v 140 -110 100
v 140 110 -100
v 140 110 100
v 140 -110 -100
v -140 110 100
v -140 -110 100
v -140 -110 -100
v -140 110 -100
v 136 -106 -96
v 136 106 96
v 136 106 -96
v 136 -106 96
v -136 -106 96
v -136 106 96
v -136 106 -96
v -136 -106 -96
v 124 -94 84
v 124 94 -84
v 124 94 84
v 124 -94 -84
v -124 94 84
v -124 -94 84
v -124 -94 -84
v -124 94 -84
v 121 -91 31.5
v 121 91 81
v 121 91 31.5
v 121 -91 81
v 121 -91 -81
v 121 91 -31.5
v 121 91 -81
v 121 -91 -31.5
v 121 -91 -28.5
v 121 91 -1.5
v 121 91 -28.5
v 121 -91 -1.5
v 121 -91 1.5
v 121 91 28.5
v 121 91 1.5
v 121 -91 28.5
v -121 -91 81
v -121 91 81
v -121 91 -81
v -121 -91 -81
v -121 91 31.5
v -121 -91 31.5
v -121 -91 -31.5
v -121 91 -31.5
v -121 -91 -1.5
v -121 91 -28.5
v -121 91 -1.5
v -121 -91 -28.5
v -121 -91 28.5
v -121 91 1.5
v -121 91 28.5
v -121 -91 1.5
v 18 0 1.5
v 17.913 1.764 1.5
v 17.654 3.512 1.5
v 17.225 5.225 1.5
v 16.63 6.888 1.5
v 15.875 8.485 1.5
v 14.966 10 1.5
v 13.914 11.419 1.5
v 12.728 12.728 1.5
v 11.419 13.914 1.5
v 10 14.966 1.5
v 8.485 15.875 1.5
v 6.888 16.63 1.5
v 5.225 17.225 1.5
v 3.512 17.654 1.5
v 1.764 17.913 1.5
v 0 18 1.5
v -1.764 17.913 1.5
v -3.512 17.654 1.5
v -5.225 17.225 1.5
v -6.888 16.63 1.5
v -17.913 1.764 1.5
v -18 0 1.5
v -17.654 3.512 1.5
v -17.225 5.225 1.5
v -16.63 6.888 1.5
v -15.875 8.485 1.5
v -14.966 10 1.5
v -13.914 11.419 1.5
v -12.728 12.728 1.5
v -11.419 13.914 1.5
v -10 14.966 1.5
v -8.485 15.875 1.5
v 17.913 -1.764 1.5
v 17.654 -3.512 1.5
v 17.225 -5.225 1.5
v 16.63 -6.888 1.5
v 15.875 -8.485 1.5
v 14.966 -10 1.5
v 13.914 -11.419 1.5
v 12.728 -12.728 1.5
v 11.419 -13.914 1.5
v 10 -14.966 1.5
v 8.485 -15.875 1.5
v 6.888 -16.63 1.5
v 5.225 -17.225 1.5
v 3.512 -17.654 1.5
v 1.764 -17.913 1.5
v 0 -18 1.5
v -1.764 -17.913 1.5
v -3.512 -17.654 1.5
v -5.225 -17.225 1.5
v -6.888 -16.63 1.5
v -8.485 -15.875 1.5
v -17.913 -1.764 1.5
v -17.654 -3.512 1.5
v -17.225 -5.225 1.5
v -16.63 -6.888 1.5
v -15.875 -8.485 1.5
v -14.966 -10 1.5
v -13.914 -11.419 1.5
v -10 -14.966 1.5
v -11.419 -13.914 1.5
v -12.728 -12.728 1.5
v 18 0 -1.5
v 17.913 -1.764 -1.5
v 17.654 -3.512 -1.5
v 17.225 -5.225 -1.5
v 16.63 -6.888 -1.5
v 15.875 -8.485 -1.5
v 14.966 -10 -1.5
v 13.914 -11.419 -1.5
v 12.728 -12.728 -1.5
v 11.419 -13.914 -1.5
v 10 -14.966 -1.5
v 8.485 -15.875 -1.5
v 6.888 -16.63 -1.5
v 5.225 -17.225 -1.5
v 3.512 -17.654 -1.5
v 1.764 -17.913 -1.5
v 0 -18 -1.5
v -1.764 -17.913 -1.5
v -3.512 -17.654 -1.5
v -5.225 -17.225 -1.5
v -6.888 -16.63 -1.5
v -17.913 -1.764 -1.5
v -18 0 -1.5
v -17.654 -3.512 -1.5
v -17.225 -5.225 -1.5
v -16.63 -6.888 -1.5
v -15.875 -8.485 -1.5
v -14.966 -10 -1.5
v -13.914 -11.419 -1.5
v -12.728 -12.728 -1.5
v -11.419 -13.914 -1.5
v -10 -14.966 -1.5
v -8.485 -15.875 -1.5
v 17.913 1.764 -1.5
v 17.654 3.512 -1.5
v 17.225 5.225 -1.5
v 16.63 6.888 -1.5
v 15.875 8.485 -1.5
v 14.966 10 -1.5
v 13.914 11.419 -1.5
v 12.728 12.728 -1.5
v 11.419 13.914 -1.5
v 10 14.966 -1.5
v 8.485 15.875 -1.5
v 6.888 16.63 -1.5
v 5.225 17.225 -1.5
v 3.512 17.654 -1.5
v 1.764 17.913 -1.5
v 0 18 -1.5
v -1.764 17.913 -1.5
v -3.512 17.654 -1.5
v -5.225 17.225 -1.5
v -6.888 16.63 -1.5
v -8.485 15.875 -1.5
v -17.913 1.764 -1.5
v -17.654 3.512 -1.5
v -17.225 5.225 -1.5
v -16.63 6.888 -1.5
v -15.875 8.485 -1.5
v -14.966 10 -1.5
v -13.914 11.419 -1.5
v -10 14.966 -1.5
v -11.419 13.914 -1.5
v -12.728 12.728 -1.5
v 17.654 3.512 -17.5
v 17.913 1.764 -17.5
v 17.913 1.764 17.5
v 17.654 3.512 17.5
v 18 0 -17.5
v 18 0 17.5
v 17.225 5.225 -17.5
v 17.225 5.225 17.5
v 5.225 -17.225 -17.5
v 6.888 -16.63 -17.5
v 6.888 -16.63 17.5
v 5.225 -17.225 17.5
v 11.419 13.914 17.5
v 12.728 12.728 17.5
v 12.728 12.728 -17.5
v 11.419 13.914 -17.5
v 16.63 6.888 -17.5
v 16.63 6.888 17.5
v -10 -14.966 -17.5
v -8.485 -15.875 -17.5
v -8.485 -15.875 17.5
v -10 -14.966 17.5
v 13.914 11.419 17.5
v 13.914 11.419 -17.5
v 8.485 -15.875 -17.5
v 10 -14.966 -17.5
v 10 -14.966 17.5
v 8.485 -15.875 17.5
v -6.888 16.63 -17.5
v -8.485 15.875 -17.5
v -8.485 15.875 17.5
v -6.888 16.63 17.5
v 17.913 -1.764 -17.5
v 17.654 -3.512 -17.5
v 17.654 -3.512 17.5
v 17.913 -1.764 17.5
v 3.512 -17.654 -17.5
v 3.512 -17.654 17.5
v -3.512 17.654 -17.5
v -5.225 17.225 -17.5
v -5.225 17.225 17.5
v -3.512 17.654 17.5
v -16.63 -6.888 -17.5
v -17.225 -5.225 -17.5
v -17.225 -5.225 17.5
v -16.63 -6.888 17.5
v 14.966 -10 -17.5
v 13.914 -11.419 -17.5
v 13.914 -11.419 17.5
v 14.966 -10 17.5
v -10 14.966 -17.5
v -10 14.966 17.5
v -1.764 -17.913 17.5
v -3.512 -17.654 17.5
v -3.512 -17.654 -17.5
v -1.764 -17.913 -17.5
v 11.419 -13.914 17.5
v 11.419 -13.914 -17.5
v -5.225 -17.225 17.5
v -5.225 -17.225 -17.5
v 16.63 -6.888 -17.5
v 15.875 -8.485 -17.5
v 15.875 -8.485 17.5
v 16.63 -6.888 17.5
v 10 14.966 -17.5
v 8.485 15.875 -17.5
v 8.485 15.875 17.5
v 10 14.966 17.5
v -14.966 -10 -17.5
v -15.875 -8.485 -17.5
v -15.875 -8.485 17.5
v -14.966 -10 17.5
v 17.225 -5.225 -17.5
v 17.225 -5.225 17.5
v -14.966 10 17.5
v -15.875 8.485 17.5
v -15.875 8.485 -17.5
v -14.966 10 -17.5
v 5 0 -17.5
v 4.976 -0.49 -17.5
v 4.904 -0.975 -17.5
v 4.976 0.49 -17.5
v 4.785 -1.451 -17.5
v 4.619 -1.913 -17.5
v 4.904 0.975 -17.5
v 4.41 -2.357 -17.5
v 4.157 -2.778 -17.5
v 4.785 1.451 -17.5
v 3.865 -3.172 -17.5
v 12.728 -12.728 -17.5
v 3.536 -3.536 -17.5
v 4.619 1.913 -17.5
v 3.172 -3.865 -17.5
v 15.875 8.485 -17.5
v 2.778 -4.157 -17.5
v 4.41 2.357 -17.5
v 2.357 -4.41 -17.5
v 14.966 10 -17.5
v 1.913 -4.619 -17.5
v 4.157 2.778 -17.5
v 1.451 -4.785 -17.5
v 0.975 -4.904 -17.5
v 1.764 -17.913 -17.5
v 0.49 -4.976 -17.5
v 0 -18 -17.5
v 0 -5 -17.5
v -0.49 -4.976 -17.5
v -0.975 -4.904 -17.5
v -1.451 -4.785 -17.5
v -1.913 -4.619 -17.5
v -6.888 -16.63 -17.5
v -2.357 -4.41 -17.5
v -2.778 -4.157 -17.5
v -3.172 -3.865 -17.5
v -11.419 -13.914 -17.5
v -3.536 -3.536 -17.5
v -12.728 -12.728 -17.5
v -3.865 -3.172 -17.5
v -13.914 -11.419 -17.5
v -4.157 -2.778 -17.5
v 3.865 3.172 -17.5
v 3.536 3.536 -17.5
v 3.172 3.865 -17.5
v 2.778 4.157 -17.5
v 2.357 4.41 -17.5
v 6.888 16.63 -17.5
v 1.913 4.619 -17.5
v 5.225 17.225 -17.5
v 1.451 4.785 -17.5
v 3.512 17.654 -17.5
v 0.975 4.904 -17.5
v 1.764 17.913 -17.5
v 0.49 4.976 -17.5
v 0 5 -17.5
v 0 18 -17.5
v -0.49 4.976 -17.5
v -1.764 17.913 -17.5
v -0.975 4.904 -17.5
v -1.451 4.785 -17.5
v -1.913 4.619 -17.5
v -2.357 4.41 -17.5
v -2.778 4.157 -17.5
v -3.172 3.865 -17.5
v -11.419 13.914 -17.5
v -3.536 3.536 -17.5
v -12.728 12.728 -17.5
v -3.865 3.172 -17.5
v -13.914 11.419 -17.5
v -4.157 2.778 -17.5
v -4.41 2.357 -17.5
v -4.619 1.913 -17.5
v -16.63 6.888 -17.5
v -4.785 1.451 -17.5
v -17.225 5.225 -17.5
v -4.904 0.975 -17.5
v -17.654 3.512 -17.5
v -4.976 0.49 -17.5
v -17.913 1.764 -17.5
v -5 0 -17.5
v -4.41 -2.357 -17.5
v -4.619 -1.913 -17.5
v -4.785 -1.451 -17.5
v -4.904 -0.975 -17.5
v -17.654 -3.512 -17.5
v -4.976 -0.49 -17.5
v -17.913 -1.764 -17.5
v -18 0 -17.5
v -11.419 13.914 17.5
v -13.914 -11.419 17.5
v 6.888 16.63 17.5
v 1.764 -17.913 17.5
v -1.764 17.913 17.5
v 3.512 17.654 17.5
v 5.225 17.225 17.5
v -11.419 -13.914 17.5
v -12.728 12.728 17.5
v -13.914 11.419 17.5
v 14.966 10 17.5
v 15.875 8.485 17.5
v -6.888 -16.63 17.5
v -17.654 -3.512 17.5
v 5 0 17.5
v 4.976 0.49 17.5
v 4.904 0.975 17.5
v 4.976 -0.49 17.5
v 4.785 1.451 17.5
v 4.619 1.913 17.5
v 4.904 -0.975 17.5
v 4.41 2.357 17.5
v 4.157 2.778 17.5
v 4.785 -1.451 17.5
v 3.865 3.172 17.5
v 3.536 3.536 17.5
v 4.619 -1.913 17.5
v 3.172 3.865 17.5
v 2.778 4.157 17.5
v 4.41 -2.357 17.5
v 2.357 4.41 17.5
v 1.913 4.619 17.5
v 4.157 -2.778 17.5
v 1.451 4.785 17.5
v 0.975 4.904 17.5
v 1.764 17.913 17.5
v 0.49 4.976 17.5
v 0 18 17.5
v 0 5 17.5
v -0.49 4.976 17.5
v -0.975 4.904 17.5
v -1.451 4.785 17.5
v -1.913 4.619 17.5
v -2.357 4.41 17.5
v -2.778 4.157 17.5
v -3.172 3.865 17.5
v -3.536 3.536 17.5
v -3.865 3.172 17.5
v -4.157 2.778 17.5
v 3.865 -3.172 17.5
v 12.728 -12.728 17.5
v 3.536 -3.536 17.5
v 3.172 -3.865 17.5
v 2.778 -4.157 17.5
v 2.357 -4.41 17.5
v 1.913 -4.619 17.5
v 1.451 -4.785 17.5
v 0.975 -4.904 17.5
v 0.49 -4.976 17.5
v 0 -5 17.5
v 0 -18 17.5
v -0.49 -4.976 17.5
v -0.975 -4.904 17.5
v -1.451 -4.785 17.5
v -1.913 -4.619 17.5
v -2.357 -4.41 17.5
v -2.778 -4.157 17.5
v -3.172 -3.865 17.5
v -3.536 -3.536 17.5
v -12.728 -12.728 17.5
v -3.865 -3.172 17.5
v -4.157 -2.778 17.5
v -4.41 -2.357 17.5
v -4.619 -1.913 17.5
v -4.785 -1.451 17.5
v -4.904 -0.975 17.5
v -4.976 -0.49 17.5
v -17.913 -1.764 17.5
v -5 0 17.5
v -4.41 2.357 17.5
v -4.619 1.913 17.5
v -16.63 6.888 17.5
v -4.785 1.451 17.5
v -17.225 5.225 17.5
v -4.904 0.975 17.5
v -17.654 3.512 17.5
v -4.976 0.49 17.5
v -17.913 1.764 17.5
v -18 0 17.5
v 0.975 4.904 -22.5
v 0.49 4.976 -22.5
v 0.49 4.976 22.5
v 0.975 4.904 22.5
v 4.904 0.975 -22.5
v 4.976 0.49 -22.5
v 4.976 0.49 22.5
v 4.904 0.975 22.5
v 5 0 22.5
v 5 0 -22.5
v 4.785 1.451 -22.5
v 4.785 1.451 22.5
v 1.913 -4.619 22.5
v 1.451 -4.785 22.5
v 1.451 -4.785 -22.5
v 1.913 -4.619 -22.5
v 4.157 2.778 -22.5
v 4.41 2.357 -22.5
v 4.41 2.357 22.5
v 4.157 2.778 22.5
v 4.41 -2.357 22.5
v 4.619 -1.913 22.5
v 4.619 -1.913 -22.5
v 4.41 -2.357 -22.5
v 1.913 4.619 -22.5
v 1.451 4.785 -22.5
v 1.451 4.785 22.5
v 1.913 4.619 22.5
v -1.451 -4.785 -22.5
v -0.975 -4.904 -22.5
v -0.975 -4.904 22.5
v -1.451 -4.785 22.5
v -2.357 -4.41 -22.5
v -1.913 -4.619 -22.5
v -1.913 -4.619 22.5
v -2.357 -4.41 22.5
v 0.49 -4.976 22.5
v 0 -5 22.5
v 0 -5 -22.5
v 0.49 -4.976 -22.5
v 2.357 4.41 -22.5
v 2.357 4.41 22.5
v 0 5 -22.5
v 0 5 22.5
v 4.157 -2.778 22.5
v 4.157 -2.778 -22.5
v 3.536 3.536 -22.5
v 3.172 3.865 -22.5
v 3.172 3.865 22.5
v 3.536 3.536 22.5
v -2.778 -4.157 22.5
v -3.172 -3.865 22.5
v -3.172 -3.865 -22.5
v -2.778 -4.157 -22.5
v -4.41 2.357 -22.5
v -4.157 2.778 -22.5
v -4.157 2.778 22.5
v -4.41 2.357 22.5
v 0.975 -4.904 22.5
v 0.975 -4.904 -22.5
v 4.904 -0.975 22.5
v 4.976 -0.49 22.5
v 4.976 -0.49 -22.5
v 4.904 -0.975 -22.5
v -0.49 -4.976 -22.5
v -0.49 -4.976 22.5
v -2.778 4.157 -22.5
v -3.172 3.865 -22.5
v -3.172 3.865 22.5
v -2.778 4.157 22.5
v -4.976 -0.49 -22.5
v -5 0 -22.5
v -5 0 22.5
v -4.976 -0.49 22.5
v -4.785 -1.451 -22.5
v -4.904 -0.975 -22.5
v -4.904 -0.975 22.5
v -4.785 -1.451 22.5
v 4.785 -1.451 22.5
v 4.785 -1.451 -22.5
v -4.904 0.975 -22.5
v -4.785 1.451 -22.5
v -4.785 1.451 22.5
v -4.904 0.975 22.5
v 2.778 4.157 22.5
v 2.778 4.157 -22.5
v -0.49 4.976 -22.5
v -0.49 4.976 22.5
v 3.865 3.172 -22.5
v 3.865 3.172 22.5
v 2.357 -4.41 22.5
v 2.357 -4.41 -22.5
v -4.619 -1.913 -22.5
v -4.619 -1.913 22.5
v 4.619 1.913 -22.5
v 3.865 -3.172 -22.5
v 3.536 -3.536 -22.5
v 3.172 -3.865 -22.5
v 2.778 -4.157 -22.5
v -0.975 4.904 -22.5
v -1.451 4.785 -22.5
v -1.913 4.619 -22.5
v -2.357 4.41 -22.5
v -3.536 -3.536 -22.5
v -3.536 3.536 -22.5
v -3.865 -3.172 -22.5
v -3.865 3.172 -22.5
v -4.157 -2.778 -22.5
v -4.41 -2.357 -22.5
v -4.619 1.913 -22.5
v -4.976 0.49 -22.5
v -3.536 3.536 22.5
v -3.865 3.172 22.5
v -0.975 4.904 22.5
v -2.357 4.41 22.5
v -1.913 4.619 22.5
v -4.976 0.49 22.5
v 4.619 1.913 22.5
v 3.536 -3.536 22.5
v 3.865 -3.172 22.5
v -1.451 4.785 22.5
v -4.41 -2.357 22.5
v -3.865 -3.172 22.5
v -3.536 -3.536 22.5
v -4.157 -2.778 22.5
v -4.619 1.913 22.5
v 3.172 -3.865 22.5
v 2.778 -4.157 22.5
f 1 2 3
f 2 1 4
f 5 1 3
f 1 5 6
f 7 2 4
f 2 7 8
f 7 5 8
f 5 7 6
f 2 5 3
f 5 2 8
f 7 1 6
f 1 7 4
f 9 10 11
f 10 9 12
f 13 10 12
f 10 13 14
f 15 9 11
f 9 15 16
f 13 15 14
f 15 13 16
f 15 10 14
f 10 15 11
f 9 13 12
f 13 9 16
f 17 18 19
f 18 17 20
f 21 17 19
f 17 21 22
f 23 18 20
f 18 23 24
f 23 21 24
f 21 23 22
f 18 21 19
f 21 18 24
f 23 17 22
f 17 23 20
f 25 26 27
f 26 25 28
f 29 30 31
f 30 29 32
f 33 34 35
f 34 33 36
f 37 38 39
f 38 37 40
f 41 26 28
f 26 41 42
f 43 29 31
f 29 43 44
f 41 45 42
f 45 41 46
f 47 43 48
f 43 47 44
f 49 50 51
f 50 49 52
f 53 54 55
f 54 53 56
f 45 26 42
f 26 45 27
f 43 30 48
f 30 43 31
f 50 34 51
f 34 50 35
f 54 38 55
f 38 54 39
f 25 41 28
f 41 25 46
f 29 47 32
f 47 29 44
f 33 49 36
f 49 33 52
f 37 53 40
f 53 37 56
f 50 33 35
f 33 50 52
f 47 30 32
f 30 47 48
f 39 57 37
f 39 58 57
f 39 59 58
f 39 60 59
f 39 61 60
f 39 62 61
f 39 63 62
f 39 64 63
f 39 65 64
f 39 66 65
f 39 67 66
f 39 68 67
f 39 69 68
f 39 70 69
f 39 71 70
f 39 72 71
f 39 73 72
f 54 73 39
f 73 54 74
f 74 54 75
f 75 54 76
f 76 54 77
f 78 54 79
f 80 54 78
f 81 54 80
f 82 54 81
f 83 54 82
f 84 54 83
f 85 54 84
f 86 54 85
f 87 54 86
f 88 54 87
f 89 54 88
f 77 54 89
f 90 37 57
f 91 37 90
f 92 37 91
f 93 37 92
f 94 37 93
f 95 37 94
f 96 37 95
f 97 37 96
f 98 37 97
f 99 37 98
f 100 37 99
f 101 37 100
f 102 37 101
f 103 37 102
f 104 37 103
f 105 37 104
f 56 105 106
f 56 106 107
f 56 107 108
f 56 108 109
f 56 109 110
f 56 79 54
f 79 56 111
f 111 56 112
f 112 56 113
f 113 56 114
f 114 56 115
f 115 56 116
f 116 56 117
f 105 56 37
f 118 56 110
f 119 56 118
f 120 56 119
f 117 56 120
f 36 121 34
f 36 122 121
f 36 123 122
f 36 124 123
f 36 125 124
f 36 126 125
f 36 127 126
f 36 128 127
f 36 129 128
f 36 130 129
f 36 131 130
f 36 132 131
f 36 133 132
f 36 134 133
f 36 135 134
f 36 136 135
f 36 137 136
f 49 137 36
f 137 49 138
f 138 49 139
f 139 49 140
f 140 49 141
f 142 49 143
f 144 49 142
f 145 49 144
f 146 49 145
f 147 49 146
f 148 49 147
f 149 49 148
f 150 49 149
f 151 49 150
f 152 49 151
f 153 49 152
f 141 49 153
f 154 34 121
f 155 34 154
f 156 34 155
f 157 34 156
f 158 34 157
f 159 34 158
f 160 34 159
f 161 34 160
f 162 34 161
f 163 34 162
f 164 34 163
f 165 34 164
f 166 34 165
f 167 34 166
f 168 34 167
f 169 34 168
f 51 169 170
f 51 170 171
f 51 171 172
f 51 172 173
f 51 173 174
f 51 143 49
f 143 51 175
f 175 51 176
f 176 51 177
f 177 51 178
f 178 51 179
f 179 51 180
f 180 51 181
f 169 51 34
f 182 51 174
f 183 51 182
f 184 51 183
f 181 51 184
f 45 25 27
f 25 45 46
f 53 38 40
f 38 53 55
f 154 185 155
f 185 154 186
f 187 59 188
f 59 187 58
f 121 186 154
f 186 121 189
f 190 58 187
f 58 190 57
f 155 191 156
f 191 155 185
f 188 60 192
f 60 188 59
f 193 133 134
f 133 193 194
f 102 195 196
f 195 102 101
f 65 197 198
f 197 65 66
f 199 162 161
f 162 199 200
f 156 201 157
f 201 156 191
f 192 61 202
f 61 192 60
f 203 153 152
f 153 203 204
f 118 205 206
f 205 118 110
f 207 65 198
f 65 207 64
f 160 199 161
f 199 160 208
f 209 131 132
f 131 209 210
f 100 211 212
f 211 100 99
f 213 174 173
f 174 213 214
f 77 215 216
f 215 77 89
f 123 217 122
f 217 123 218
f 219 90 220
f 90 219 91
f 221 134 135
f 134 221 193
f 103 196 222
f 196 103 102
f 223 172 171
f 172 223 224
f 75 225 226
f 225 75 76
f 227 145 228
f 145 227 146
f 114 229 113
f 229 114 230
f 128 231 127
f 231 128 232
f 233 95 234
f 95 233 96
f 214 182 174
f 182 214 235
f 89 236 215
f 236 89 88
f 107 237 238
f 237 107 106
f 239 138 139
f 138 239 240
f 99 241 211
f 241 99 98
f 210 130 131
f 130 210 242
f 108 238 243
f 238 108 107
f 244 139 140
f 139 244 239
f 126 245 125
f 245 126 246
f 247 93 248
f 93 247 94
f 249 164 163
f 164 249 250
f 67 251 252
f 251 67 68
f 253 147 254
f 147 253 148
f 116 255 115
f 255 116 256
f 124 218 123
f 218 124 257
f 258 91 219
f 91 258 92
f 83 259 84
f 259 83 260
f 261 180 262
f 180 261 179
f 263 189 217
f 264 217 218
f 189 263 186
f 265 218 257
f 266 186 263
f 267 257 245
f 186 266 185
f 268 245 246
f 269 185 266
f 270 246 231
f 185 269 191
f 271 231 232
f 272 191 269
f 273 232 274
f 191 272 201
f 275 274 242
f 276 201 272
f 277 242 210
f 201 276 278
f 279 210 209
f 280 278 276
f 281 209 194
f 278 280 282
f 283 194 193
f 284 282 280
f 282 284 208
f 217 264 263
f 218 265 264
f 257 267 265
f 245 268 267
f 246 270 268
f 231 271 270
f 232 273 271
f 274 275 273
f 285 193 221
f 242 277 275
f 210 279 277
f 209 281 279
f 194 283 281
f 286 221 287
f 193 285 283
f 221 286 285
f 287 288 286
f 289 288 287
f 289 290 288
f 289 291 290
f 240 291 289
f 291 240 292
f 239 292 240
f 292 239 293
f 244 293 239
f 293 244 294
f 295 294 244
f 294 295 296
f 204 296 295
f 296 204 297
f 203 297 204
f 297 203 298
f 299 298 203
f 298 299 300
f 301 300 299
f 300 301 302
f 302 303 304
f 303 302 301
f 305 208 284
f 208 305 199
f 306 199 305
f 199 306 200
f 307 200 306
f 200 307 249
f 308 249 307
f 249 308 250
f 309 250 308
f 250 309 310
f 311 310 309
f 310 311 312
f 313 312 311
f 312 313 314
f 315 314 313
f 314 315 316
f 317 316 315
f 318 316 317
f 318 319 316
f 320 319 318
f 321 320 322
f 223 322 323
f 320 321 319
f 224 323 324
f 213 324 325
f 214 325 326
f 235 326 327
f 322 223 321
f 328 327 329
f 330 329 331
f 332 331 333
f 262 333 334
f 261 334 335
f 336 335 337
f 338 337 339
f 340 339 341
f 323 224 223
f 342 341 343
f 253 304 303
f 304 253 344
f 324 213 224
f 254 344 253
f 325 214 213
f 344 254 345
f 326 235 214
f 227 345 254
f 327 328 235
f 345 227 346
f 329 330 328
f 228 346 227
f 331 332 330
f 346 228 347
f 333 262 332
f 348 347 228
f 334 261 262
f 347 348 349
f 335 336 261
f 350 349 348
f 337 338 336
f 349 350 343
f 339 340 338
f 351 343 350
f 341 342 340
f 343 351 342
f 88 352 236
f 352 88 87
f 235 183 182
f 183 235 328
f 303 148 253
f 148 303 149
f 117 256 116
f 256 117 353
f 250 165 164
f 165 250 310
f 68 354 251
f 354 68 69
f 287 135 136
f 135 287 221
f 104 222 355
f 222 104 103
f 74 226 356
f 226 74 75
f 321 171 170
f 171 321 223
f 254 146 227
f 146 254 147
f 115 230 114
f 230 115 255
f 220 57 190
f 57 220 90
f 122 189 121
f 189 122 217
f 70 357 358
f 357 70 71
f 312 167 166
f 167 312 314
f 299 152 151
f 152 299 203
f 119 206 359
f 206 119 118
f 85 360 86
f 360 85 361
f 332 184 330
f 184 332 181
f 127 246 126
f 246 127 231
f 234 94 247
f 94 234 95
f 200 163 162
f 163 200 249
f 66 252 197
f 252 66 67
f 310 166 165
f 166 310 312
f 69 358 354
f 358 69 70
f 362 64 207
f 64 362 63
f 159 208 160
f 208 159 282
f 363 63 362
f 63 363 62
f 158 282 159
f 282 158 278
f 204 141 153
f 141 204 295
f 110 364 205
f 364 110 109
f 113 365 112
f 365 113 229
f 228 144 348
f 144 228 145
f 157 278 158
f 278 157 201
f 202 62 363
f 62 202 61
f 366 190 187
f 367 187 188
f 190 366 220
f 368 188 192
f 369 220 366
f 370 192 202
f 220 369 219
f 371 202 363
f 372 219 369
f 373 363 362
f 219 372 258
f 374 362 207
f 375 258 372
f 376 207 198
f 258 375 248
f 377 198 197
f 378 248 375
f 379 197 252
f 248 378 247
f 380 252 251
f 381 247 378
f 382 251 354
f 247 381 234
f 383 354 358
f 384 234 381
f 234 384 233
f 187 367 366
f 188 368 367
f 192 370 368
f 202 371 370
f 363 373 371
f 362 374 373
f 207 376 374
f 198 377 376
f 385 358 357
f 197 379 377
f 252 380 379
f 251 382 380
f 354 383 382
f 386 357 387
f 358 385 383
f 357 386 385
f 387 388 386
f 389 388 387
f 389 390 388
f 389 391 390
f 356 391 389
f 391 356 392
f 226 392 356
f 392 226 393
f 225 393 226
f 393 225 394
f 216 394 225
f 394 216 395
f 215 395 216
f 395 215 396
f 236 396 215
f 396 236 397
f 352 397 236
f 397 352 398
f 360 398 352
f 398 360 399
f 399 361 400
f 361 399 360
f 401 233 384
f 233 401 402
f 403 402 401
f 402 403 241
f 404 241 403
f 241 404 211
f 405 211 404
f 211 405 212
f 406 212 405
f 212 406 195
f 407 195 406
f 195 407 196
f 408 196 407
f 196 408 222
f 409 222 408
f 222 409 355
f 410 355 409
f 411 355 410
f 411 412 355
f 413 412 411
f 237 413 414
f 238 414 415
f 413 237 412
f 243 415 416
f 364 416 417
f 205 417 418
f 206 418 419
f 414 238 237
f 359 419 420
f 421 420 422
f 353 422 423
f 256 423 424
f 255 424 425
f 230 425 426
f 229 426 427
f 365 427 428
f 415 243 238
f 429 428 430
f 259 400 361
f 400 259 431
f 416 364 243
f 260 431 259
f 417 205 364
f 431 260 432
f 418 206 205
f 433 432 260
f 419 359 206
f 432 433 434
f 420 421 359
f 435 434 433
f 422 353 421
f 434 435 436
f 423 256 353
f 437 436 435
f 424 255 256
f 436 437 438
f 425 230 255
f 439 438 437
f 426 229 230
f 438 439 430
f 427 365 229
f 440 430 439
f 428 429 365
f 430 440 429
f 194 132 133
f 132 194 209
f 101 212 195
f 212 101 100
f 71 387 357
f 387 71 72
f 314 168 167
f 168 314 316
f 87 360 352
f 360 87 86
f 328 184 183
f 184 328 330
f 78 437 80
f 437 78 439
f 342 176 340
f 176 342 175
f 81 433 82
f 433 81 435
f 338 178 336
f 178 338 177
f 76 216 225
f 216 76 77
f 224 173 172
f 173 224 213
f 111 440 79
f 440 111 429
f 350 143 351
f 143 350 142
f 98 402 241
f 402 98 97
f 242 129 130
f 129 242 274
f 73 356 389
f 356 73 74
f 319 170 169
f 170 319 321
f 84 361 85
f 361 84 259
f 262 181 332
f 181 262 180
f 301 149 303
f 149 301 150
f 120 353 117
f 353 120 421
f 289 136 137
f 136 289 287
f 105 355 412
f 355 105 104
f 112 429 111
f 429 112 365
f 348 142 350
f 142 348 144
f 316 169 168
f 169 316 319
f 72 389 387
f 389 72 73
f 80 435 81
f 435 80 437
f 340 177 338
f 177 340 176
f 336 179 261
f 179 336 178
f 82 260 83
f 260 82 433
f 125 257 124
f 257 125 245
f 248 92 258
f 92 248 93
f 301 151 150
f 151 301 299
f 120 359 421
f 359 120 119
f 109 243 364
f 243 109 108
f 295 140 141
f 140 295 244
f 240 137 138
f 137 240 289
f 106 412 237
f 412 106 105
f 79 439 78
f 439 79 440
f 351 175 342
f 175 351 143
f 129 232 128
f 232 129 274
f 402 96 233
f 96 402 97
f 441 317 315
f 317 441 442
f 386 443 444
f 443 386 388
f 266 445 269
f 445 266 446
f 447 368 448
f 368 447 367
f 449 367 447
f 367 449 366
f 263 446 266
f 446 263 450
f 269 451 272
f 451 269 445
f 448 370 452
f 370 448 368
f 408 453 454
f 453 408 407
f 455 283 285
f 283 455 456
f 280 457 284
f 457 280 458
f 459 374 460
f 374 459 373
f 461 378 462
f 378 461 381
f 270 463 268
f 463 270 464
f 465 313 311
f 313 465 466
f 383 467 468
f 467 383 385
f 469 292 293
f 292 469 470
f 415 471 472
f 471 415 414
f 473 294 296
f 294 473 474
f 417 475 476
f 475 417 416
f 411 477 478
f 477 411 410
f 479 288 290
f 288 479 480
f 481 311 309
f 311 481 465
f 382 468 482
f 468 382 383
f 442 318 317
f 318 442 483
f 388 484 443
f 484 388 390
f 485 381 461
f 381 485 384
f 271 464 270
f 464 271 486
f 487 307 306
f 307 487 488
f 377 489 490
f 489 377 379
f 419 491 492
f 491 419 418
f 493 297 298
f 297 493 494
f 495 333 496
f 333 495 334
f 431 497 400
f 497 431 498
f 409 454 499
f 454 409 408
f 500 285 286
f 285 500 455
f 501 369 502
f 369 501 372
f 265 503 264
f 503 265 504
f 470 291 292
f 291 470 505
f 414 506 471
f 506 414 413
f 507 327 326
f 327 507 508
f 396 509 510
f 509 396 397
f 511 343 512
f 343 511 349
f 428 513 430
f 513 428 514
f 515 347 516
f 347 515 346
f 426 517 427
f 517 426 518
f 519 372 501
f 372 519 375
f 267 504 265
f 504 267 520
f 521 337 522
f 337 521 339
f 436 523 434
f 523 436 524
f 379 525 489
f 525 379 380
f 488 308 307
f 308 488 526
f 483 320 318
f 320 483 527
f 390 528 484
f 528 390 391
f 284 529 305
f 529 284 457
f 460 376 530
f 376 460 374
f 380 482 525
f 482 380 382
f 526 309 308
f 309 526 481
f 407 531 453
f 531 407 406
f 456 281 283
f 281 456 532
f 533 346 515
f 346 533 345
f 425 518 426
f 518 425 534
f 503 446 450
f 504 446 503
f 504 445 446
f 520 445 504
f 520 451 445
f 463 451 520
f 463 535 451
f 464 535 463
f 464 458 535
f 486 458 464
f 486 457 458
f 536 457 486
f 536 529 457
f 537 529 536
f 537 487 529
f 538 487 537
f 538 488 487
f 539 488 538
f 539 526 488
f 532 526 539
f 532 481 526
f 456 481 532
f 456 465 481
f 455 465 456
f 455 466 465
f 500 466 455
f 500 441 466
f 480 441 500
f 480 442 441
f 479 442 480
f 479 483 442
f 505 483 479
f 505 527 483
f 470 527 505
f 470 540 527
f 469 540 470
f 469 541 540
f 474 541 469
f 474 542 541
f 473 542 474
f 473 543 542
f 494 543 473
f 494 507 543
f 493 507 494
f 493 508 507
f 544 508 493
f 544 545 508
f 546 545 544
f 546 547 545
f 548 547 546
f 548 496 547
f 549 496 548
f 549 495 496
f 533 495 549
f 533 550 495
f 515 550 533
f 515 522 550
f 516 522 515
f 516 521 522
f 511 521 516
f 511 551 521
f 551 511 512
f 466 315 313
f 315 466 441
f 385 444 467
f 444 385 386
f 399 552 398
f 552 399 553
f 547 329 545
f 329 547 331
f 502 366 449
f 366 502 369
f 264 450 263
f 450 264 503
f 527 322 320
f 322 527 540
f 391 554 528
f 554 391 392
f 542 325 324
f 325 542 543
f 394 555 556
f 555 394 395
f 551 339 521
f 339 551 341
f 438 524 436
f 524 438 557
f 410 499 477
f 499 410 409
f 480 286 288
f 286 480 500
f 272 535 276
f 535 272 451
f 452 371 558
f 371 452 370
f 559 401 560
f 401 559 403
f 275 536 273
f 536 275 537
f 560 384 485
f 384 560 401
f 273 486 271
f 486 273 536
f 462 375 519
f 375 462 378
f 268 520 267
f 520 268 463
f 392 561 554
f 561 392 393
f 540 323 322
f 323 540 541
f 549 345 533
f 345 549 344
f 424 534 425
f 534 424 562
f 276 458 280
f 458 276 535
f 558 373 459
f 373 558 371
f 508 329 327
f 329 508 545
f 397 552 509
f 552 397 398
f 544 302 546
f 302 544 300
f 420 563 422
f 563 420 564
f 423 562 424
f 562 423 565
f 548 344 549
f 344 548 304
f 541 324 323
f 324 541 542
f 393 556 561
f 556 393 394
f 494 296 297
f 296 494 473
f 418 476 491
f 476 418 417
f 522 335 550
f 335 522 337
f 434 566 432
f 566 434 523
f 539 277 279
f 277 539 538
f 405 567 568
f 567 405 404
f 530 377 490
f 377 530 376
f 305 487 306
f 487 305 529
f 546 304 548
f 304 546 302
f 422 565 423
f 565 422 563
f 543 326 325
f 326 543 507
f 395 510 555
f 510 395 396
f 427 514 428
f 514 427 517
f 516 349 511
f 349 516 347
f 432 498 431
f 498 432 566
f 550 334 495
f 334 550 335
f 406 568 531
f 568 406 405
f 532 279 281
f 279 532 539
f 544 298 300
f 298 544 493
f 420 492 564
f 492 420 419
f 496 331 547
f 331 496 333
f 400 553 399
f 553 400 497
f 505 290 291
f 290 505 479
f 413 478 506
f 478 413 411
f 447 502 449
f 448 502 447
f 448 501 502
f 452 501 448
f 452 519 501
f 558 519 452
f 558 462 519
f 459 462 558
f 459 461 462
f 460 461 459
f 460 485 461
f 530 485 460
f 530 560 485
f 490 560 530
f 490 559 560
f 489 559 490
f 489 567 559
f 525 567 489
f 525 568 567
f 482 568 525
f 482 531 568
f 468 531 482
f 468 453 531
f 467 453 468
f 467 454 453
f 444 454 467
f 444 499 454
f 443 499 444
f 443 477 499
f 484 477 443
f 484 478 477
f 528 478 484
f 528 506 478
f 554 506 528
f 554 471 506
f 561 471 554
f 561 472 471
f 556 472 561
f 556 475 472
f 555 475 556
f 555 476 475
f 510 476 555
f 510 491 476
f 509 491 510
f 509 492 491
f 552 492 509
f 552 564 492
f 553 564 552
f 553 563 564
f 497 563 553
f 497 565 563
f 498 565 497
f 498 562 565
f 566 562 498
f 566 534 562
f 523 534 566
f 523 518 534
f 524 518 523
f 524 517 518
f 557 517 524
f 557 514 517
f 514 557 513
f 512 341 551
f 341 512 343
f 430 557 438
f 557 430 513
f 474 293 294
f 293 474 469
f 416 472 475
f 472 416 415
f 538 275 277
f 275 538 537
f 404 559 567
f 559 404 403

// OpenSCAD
// File: docs/hardware/mechanical/biochem_incubator_housing.scad
// System: USS Iowa Biochemical Lab Module - Shock-Stabilized Incubator Housing
// Adheres to parameters for BIOCHEM-970-1070 and Verdura-Rx processing arrays

$fn = 64;

// Housing Enclosure Parameters (in millimeters)
ext_width   = 280.0;
ext_depth   = 220.0;
ext_height  = 200.0;
insulation_t = 12.0;
wall_t       = 4.0;

module insulated_outer_shell() {
    difference() {
        // Outer Protective Armor Hull
        color("slategrey") 
            cube([ext_width, ext_depth, ext_height], center = true);
        
        // Inner Insulation Cavity Boundary
        cube([ext_width - (wall_t * 2), 
              ext_depth - (wall_t * 2), 
              ext_height - (wall_t * 2)], center = true);
    }
}

module internal_incubation_chamber() {
    // Suspended internal structural compartment hosting internal processing trays
    inner_w = ext_width - (wall_t * 2) - (insulation_t * 2);
    inner_d = ext_depth - (wall_t * 2) - (insulation_t * 2);
    inner_h = ext_height - (wall_t * 2) - (insulation_t * 2);

    translate([0, 0, 0]) {
        difference() {
            // Lab Grade Chamber Core Block
            color("ghostwhite", 0.8) 
                cube([inner_w, inner_d, inner_h], center = true);
            
            // Working Core Volume Cutout
            cube([inner_w - 6, inner_d - 6, inner_h - 6], center = true);
        }
        
        // Internal Rack Guide Support Tracks
        color("silver") {
            for (z_offset = [-30, 0, 30]) {
                translate([0, 0, z_offset])
                    cube([inner_w - 4, inner_d - 2, 3], center = true);
            }
        }
    }
}

module heavy_deck_shock_absorbers() {
    // Corner industrial spring/elastomer isolation mount points to handle hull shock
    mount_r = 18.0;
    mount_h = 35.0;
    
    positions = [
        [ ext_width/2 - 20,  ext_depth/2 - 20],
        [ ext_width/2 - 20, -ext_depth/2 + 20],
        [-ext_width/2 + 20,  ext_depth/2 - 20],
        [-ext_width/2 + 20, -ext_depth/2 + 20]
    ];
    
    for (pos = positions) {
        translate([pos, pos, -ext_height/2 - mount_h/2]) {
            // Outer Rubber Buffer boot
            color("black") cylinder(r = mount_r, h = mount_h, center = true);
            // Steel anchor rod core
            color("darkgrey") cylinder(r = 5.0, h = mount_h + 10, center = true);
        }
    }
}

// Global System Evaluation Model Construction
union() {
    insulated_outer_shell();
    internal_incubation_chamber();
    heavy_deck_shock_absorbers();
}
